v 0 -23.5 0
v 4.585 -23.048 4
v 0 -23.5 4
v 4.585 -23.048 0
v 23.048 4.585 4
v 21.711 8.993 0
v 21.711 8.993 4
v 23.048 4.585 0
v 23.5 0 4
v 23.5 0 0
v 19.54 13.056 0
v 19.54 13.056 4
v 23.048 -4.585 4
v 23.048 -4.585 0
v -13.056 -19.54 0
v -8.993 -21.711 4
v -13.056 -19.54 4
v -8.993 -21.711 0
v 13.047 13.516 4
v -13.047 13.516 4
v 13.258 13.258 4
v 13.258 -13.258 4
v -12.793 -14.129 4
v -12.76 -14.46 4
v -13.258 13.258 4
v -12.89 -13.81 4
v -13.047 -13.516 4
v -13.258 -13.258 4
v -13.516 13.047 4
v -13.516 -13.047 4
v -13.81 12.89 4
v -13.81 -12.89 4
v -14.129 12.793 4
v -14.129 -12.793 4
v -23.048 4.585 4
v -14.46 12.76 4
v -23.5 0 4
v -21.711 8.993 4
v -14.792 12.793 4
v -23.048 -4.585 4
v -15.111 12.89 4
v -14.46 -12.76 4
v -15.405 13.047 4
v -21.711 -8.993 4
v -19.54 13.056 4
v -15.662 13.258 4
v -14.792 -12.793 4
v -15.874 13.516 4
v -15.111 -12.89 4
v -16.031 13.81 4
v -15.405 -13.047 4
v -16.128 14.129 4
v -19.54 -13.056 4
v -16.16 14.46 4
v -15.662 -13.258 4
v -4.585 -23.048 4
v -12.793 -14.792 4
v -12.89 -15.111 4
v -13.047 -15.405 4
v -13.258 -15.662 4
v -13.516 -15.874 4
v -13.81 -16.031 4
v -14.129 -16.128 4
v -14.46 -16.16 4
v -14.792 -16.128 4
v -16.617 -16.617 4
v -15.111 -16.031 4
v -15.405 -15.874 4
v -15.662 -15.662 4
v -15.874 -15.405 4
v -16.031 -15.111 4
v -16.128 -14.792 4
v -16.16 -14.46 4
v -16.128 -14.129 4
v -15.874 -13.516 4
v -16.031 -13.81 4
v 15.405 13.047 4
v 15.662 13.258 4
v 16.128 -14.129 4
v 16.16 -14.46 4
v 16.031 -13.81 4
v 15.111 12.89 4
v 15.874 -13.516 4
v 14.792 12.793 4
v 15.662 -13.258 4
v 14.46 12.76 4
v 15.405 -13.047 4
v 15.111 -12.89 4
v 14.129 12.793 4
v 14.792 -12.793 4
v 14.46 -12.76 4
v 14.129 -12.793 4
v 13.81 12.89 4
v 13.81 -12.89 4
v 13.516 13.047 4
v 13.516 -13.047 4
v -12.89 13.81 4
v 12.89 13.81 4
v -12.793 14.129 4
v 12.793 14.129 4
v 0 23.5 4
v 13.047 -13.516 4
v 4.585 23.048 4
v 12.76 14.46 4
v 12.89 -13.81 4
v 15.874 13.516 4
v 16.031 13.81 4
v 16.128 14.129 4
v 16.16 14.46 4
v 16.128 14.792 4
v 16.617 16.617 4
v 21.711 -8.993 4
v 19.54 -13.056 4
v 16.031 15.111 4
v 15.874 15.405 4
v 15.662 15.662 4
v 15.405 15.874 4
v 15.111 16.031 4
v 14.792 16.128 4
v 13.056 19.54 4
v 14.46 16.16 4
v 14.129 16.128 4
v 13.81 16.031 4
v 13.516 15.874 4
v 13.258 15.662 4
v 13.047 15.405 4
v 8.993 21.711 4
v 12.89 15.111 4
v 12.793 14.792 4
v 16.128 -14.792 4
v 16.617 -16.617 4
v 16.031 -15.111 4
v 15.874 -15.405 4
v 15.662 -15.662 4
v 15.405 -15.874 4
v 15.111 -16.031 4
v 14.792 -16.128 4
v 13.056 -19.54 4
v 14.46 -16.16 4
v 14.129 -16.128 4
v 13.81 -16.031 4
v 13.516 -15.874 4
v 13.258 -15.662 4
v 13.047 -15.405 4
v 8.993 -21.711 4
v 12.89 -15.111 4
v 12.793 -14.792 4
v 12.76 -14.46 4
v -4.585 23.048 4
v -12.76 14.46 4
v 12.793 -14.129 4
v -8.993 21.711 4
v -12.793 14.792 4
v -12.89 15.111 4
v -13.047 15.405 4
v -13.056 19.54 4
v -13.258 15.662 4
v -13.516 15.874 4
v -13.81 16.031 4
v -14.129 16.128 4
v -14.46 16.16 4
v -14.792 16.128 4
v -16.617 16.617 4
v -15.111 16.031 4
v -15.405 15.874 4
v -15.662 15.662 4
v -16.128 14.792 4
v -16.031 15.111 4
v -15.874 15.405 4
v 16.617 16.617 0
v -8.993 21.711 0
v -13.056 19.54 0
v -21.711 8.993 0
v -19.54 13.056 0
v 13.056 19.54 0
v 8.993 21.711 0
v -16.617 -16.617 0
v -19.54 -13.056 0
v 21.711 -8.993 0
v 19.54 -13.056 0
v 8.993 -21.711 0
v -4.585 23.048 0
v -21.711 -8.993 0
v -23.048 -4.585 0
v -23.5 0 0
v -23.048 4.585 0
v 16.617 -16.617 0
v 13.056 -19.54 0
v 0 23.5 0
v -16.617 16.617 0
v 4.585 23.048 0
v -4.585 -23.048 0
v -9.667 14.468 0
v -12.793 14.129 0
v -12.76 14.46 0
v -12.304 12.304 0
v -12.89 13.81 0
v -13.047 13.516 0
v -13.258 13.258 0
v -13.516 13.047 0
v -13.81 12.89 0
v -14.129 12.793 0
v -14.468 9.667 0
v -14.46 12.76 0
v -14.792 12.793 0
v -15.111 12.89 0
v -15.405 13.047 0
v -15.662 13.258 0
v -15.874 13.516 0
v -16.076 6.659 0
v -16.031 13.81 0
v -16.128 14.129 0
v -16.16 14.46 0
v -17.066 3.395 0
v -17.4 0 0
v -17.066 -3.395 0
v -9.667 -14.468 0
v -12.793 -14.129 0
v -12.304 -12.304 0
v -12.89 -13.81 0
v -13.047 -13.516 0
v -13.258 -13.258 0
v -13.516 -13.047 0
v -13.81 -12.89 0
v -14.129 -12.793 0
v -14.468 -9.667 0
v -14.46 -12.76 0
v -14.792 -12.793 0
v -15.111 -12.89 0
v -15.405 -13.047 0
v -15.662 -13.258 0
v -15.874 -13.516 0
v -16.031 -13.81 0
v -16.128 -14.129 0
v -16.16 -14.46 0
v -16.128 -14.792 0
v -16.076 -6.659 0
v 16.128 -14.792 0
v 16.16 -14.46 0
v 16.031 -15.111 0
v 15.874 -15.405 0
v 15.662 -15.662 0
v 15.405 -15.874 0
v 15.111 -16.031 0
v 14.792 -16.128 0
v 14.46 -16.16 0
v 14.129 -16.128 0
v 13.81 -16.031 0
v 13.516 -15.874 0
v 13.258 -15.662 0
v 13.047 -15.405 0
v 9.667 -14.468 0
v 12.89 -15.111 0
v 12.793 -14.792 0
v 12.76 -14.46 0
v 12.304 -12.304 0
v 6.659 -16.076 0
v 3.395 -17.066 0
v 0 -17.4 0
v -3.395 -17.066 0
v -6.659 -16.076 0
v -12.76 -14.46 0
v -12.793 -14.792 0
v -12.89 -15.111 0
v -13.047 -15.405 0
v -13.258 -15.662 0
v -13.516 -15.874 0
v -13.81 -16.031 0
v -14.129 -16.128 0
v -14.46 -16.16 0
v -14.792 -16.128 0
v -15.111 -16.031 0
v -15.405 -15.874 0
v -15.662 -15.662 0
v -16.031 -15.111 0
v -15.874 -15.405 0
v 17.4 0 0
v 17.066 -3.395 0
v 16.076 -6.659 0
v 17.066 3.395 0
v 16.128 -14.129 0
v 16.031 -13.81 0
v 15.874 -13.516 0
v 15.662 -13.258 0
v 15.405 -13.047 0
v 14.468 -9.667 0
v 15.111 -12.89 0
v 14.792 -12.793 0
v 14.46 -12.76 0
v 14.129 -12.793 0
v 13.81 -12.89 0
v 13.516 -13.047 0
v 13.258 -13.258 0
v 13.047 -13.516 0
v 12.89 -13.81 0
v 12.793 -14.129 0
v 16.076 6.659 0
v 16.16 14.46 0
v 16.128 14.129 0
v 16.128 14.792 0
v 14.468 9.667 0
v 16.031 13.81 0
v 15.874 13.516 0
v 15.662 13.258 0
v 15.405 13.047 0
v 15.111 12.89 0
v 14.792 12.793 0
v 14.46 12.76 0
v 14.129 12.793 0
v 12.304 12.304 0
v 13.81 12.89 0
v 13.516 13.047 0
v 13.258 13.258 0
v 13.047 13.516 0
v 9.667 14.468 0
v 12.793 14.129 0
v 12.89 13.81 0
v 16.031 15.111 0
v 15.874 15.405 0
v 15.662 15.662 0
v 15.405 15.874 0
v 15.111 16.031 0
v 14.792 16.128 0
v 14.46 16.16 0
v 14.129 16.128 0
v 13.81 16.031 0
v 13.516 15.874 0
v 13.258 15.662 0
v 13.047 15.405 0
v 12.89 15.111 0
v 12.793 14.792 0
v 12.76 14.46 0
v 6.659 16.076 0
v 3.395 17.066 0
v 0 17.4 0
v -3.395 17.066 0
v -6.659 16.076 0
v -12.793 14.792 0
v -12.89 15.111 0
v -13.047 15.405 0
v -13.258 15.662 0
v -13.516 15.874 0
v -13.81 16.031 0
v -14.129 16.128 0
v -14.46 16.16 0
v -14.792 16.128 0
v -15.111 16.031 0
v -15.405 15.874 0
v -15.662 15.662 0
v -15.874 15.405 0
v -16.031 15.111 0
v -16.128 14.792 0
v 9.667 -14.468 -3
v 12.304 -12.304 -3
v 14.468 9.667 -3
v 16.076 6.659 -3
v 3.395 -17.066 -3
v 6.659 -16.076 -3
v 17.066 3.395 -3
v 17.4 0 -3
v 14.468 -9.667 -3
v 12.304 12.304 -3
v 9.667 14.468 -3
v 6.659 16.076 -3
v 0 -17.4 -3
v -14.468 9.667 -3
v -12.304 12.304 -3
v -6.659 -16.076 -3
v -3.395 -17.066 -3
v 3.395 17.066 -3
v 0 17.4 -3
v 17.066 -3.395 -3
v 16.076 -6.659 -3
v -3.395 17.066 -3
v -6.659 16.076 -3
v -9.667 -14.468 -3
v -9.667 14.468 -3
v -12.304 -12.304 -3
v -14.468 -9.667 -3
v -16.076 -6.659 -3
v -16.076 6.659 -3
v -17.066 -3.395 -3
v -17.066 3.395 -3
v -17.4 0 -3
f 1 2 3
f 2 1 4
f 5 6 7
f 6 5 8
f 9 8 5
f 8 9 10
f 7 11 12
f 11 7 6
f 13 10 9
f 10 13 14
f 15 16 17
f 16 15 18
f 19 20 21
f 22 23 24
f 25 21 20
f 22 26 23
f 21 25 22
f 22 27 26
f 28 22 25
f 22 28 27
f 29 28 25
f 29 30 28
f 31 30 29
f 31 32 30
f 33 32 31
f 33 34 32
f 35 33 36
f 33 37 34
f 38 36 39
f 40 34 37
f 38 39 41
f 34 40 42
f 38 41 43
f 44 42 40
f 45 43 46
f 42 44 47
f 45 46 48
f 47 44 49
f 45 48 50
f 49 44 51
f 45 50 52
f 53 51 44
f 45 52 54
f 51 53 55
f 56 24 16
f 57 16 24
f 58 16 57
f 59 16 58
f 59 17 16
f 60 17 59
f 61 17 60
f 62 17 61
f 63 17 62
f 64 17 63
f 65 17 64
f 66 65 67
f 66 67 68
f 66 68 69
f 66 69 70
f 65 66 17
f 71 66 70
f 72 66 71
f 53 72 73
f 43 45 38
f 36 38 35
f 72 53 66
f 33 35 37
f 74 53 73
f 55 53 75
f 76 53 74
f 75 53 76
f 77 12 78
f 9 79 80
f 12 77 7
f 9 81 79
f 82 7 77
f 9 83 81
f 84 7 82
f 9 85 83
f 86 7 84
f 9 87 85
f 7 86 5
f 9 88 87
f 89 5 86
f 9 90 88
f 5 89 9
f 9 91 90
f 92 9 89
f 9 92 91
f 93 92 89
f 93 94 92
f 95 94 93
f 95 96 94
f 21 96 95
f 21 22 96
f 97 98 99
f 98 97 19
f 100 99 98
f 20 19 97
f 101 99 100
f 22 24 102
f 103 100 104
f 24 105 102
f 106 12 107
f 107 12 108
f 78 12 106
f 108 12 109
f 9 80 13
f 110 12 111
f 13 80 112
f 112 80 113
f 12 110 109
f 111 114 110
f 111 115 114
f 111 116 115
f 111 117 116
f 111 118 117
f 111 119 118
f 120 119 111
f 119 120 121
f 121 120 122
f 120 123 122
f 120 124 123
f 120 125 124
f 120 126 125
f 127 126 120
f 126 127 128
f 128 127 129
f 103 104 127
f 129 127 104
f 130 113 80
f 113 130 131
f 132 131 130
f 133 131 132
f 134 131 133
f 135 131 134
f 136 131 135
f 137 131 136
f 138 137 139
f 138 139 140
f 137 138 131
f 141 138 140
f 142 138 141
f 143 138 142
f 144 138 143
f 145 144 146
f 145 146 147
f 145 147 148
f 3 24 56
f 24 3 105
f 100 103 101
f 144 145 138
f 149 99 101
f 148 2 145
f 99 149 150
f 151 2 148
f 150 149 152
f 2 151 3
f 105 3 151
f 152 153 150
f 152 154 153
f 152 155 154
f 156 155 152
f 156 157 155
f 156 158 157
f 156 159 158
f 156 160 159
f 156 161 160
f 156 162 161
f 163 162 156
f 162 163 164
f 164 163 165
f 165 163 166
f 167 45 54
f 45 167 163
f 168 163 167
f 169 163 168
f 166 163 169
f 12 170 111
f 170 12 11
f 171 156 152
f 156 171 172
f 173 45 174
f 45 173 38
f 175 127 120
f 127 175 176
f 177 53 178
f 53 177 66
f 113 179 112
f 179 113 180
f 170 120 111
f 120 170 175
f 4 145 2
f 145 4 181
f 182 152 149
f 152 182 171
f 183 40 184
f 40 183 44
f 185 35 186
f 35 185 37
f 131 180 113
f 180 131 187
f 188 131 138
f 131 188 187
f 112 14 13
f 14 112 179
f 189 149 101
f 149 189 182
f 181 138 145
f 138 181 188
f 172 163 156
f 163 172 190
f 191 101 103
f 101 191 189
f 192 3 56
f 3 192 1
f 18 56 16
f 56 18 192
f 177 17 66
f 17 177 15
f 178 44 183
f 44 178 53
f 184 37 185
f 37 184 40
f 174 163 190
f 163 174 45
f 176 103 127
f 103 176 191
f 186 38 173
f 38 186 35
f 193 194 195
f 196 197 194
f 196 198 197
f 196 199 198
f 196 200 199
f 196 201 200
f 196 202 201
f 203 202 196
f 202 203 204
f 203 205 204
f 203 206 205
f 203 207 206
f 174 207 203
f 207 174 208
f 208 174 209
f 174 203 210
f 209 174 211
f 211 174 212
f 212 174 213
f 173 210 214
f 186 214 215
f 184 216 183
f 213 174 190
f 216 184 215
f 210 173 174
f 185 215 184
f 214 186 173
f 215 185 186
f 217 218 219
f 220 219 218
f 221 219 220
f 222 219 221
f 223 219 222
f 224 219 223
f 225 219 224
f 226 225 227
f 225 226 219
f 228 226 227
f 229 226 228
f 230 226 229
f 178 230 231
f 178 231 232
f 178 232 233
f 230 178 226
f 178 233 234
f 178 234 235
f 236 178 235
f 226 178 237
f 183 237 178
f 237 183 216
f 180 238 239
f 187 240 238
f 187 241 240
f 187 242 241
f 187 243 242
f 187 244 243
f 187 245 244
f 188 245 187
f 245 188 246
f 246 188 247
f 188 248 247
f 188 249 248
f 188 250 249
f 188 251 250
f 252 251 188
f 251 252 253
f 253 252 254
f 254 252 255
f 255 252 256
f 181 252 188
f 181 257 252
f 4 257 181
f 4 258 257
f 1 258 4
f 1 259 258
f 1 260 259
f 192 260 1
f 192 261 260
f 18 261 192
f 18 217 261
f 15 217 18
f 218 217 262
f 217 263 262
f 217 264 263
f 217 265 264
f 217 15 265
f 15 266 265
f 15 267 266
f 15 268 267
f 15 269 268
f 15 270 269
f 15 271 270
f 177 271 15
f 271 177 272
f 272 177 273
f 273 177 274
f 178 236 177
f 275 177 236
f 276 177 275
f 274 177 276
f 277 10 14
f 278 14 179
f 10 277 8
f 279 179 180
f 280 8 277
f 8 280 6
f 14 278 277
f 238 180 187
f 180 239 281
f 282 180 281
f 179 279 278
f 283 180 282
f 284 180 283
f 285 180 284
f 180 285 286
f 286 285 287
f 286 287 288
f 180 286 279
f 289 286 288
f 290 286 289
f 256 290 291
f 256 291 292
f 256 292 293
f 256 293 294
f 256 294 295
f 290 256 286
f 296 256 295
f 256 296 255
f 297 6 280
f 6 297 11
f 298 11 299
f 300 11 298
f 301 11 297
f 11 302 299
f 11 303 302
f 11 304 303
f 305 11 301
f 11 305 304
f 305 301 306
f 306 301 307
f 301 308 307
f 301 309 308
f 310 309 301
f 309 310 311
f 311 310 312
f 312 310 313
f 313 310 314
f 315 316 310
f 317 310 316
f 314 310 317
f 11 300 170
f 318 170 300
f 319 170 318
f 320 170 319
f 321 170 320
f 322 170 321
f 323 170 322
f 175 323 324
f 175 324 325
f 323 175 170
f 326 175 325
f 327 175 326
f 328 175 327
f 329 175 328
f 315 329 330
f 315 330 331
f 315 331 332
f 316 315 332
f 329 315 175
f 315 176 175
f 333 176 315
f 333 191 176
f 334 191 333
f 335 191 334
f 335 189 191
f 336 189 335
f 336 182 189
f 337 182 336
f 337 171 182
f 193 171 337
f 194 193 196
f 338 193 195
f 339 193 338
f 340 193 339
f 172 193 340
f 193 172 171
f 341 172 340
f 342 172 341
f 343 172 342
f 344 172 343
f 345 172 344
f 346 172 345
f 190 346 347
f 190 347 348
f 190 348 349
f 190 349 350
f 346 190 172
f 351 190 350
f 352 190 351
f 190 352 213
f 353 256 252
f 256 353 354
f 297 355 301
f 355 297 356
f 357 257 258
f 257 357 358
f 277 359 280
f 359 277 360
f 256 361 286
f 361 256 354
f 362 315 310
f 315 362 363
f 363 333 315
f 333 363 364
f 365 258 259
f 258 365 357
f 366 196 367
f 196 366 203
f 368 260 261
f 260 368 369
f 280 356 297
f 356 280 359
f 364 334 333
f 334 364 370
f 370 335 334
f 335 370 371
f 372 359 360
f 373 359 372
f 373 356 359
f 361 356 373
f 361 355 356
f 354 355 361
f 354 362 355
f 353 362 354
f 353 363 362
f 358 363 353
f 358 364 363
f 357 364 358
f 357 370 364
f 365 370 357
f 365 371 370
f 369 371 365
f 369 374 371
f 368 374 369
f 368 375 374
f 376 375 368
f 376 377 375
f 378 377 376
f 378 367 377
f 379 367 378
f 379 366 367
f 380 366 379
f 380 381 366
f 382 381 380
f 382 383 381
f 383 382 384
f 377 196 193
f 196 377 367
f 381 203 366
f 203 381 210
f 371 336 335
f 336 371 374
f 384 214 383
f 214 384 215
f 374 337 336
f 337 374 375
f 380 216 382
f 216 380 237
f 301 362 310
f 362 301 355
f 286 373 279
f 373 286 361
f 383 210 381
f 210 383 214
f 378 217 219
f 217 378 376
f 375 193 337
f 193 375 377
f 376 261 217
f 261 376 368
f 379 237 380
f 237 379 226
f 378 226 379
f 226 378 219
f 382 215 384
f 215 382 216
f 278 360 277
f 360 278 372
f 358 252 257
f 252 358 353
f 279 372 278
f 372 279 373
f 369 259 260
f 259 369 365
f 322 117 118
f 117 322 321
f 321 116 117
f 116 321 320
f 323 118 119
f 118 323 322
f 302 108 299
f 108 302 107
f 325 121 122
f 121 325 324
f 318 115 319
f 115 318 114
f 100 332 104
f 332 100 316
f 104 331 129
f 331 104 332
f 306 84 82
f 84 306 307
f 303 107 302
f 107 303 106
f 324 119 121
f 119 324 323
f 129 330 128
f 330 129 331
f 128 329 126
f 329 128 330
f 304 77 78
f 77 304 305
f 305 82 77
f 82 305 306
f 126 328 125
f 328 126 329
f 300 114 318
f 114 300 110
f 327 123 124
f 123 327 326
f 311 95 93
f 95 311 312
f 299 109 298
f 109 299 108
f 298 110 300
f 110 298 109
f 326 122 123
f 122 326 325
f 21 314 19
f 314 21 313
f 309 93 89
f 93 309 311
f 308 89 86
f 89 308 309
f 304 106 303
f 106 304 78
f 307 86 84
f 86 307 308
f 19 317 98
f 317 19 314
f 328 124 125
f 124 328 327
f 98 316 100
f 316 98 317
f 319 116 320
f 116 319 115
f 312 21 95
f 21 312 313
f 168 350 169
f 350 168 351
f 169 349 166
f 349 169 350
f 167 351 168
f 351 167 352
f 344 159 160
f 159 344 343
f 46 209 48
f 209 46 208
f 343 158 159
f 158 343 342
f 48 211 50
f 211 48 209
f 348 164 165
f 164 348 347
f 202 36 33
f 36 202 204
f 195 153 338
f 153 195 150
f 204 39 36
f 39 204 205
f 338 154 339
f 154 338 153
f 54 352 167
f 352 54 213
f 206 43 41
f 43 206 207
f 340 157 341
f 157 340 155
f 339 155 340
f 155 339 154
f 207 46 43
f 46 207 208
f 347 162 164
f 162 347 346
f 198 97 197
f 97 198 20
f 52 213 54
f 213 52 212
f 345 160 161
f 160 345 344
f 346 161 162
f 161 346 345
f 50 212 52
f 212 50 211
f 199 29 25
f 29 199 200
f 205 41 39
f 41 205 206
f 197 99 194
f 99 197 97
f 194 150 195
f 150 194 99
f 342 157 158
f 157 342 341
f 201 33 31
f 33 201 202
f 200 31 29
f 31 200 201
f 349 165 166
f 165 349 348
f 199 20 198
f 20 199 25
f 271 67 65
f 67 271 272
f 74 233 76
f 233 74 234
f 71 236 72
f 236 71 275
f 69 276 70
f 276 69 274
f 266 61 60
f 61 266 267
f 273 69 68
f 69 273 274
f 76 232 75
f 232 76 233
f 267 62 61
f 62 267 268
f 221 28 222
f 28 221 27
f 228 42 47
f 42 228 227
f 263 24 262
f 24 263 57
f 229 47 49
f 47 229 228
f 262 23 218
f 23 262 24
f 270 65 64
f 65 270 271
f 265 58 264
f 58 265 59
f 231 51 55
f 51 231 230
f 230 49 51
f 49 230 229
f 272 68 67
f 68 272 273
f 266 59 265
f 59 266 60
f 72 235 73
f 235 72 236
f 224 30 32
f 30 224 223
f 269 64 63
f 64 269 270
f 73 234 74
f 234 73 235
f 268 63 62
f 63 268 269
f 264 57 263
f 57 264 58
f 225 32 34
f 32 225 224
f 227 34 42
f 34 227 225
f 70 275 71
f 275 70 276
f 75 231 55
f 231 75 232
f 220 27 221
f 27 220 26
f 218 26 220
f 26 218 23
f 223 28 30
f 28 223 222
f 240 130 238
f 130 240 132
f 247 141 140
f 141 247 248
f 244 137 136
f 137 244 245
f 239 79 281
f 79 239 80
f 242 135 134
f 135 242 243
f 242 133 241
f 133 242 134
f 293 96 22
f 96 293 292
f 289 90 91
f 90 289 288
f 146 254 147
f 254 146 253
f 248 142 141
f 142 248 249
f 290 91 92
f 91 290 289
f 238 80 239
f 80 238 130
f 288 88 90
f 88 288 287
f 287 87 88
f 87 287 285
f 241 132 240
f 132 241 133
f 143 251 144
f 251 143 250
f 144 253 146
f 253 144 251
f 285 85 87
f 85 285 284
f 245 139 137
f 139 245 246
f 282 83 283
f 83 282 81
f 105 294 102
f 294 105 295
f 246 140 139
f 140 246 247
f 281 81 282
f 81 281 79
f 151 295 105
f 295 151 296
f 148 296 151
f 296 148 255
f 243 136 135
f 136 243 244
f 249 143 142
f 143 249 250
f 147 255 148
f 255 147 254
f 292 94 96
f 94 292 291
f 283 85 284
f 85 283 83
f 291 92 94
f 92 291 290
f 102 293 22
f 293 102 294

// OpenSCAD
$fn = 32;

// ----------------------------------------------------------------------
// Retaining cap: 6202 cover, 47 mm, spigot 34.8 mm
// ----------------------------------------------------------------------

// --- parameters (mm) ---
cap_d = 47;               // cover diameter
cap_t = 4;                // cover thickness
lip_d = 34.8;             // spigot that enters the housing
lip_h = 3;                // spigot height
bolt_d = 3.4;             // bolt clearance
bolt_r = 20.45;           // bolt circle radius

module cover() {
  cylinder(h = cap_t, d = cap_d);
}

module spigot() {
  /* sunk 1 mm into the cover; the spigot sets the overall height */
  translate([0, 0, -lip_h]) cylinder(h = lip_h + 1, d = lip_d);
}

difference() {
  union() {
    cover();
    spigot();
  }
  for (i = [0 : 3]) rotate([0, 0, 45 + i * 90]) translate([bolt_r, 0, -lip_h - 1])
    cylinder(h = lip_h + cap_t + 2, d = bolt_d);
}
